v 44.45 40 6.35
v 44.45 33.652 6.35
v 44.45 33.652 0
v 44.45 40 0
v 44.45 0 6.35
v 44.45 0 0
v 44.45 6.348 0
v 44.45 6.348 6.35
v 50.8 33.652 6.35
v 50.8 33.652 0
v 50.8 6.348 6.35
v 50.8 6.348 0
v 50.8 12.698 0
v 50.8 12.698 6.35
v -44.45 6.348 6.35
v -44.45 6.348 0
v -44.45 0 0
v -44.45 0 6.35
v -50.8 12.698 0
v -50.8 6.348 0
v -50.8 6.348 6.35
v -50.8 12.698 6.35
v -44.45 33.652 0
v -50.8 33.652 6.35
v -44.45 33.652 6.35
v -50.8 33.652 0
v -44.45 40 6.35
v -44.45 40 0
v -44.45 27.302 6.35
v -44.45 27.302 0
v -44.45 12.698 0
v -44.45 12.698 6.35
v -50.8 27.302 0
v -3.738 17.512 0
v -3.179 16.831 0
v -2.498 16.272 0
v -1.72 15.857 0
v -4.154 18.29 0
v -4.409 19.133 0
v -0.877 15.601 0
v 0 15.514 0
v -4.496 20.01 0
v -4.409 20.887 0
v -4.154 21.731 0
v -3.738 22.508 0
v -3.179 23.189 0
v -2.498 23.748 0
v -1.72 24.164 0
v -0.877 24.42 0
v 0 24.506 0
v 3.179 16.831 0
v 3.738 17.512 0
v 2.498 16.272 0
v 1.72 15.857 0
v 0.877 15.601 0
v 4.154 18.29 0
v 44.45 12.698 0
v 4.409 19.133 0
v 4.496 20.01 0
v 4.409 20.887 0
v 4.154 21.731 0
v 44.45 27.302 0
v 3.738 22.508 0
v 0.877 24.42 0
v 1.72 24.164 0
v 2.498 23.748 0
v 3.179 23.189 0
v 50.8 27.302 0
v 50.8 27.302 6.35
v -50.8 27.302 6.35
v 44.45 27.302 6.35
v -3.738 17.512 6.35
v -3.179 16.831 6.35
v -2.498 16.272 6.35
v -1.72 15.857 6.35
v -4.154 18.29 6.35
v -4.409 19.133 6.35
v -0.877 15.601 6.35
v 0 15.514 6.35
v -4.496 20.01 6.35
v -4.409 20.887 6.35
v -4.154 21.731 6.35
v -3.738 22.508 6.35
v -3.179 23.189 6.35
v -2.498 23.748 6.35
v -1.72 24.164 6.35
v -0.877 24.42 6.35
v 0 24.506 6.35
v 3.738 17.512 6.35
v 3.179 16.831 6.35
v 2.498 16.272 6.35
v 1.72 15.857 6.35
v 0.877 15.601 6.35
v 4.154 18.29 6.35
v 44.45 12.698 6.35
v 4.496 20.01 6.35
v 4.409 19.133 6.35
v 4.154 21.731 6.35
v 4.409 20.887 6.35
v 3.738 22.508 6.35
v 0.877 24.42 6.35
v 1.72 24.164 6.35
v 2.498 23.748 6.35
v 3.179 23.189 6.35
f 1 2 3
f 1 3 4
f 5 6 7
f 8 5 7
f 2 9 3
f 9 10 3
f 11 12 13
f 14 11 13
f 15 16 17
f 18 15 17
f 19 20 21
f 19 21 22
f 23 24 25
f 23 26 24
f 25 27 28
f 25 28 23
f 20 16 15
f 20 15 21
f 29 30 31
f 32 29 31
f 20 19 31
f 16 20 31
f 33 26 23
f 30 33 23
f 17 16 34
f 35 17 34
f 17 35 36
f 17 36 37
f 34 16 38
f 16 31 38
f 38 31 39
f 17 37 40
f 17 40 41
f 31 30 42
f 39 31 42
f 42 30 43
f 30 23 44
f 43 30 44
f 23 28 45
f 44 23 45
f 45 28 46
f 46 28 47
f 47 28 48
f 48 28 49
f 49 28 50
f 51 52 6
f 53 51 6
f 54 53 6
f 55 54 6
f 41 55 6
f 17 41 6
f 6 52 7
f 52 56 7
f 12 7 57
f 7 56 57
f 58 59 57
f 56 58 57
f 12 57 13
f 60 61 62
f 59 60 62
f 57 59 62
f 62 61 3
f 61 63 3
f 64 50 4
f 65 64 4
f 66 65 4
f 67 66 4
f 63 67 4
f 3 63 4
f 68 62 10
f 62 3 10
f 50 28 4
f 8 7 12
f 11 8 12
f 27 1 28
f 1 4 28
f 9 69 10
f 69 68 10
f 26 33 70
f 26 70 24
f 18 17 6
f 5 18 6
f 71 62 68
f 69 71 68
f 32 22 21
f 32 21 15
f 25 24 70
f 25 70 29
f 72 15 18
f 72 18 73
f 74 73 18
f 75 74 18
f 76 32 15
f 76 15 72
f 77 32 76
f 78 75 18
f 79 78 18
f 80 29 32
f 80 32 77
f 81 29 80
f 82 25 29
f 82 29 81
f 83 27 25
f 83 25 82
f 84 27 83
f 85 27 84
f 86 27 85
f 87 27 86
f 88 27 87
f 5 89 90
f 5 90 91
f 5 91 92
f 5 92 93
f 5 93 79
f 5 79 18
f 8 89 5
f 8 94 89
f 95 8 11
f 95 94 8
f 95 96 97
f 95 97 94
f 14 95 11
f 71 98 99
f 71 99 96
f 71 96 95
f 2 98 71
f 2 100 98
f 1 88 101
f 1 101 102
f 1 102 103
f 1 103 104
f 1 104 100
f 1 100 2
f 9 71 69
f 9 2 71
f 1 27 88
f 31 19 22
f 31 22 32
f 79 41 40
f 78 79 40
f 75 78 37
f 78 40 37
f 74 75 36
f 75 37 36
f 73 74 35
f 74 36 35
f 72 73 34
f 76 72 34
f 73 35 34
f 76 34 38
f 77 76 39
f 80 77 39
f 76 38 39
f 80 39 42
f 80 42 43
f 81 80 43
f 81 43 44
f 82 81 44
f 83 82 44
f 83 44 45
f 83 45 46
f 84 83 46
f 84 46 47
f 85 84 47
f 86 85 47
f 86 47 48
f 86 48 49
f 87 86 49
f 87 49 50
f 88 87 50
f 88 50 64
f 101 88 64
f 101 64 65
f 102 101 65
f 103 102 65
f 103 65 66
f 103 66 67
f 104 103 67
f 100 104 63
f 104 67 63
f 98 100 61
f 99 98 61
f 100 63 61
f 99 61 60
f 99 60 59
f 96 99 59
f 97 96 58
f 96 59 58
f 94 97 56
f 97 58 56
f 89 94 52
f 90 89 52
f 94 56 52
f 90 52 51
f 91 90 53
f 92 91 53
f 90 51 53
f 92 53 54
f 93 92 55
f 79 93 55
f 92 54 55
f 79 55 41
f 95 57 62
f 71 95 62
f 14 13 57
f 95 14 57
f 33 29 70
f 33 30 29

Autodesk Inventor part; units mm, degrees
ref_plane "YZ Plane" through (0, 0, 0) normal (1, 0, 0) x (0, 1, 0)
ref_plane "XZ Plane" through (0, 0, 0) normal (0, 1, 0) x (-1, 0, 0)
ref_plane "XY Plane" through (0, 0, 0) normal (0, 0, 1) x (1, 0, 0)
sketch "Sketch1" plane through (0, 0, 0) normal (0, 0, 1) x (1, 0, 0)
  line L0 (-44.45, 0) -> (44.45, 0)
  line L1 (44.45, 0) -> (44.45, 40)
  line L2 (44.45, 40) -> (-44.45, 40)
  line L3 (-44.45, 40) -> (-44.45, 0)
  line L4 (-50.8, 33.6525) -> (-44.45, 33.6525)
  line L5 (-44.45, 33.6525) -> (-44.45, 27.3025)
  line L6 (-44.45, 27.3025) -> (-50.8, 27.3025)
  line L7 (-50.8, 27.3025) -> (-50.8, 33.6525)
  line L8 (-50.8, 12.6975) -> (-44.45, 12.6975)
  line L9 (-44.45, 12.6975) -> (-44.45, 6.3475)
  line L10 (-44.45, 6.3475) -> (-50.8, 6.3475)
  line L11 (-50.8, 6.3475) -> (-50.8, 12.6975)
  line L12 (0, 40) -> (0, 32.8851)
  line L13 (-44.45, 12.6975) -> (-44.45, 27.3025)
  line L14 (50.8, 33.6525) -> (44.45, 33.6525)
  line L15 (44.45, 33.6525) -> (44.45, 27.3025)
  line L16 (44.45, 27.3025) -> (50.8, 27.3025)
  line L17 (50.8, 27.3025) -> (50.8, 33.6525)
  line L18 (50.8, 12.6975) -> (44.45, 12.6975)
  line L19 (44.45, 12.6975) -> (44.45, 6.3475)
  line L20 (44.45, 6.3475) -> (50.8, 6.3475)
  line L21 (50.8, 6.3475) -> (50.8, 12.6975)
  line L22 (44.45, 12.6975) -> (44.45, 27.3025)
  point P0 (0, 0)
  point P1 (-44.45, 20)
  point P2 (0, 0)
  point P3 (44.45, 20)
  dimension "d0" = 40
  dimension "d1" = 88.9
  dimension "d2" = 6.35
  dimension "d3" = 6.35
  dimension "d4" = 14.605
extrude "Extrusion1" add sketch "Sketch1" along normal blind 6.35
hole "Hole1" at (0, 20.0102, 6.35) direction (0, 0, -1) diameter 8.9916 end through all clearance for "Flat Head Machine Screw" size "M8" standard "Ansi Metric M Profile"
properties part number "acrylic kinect plate"
